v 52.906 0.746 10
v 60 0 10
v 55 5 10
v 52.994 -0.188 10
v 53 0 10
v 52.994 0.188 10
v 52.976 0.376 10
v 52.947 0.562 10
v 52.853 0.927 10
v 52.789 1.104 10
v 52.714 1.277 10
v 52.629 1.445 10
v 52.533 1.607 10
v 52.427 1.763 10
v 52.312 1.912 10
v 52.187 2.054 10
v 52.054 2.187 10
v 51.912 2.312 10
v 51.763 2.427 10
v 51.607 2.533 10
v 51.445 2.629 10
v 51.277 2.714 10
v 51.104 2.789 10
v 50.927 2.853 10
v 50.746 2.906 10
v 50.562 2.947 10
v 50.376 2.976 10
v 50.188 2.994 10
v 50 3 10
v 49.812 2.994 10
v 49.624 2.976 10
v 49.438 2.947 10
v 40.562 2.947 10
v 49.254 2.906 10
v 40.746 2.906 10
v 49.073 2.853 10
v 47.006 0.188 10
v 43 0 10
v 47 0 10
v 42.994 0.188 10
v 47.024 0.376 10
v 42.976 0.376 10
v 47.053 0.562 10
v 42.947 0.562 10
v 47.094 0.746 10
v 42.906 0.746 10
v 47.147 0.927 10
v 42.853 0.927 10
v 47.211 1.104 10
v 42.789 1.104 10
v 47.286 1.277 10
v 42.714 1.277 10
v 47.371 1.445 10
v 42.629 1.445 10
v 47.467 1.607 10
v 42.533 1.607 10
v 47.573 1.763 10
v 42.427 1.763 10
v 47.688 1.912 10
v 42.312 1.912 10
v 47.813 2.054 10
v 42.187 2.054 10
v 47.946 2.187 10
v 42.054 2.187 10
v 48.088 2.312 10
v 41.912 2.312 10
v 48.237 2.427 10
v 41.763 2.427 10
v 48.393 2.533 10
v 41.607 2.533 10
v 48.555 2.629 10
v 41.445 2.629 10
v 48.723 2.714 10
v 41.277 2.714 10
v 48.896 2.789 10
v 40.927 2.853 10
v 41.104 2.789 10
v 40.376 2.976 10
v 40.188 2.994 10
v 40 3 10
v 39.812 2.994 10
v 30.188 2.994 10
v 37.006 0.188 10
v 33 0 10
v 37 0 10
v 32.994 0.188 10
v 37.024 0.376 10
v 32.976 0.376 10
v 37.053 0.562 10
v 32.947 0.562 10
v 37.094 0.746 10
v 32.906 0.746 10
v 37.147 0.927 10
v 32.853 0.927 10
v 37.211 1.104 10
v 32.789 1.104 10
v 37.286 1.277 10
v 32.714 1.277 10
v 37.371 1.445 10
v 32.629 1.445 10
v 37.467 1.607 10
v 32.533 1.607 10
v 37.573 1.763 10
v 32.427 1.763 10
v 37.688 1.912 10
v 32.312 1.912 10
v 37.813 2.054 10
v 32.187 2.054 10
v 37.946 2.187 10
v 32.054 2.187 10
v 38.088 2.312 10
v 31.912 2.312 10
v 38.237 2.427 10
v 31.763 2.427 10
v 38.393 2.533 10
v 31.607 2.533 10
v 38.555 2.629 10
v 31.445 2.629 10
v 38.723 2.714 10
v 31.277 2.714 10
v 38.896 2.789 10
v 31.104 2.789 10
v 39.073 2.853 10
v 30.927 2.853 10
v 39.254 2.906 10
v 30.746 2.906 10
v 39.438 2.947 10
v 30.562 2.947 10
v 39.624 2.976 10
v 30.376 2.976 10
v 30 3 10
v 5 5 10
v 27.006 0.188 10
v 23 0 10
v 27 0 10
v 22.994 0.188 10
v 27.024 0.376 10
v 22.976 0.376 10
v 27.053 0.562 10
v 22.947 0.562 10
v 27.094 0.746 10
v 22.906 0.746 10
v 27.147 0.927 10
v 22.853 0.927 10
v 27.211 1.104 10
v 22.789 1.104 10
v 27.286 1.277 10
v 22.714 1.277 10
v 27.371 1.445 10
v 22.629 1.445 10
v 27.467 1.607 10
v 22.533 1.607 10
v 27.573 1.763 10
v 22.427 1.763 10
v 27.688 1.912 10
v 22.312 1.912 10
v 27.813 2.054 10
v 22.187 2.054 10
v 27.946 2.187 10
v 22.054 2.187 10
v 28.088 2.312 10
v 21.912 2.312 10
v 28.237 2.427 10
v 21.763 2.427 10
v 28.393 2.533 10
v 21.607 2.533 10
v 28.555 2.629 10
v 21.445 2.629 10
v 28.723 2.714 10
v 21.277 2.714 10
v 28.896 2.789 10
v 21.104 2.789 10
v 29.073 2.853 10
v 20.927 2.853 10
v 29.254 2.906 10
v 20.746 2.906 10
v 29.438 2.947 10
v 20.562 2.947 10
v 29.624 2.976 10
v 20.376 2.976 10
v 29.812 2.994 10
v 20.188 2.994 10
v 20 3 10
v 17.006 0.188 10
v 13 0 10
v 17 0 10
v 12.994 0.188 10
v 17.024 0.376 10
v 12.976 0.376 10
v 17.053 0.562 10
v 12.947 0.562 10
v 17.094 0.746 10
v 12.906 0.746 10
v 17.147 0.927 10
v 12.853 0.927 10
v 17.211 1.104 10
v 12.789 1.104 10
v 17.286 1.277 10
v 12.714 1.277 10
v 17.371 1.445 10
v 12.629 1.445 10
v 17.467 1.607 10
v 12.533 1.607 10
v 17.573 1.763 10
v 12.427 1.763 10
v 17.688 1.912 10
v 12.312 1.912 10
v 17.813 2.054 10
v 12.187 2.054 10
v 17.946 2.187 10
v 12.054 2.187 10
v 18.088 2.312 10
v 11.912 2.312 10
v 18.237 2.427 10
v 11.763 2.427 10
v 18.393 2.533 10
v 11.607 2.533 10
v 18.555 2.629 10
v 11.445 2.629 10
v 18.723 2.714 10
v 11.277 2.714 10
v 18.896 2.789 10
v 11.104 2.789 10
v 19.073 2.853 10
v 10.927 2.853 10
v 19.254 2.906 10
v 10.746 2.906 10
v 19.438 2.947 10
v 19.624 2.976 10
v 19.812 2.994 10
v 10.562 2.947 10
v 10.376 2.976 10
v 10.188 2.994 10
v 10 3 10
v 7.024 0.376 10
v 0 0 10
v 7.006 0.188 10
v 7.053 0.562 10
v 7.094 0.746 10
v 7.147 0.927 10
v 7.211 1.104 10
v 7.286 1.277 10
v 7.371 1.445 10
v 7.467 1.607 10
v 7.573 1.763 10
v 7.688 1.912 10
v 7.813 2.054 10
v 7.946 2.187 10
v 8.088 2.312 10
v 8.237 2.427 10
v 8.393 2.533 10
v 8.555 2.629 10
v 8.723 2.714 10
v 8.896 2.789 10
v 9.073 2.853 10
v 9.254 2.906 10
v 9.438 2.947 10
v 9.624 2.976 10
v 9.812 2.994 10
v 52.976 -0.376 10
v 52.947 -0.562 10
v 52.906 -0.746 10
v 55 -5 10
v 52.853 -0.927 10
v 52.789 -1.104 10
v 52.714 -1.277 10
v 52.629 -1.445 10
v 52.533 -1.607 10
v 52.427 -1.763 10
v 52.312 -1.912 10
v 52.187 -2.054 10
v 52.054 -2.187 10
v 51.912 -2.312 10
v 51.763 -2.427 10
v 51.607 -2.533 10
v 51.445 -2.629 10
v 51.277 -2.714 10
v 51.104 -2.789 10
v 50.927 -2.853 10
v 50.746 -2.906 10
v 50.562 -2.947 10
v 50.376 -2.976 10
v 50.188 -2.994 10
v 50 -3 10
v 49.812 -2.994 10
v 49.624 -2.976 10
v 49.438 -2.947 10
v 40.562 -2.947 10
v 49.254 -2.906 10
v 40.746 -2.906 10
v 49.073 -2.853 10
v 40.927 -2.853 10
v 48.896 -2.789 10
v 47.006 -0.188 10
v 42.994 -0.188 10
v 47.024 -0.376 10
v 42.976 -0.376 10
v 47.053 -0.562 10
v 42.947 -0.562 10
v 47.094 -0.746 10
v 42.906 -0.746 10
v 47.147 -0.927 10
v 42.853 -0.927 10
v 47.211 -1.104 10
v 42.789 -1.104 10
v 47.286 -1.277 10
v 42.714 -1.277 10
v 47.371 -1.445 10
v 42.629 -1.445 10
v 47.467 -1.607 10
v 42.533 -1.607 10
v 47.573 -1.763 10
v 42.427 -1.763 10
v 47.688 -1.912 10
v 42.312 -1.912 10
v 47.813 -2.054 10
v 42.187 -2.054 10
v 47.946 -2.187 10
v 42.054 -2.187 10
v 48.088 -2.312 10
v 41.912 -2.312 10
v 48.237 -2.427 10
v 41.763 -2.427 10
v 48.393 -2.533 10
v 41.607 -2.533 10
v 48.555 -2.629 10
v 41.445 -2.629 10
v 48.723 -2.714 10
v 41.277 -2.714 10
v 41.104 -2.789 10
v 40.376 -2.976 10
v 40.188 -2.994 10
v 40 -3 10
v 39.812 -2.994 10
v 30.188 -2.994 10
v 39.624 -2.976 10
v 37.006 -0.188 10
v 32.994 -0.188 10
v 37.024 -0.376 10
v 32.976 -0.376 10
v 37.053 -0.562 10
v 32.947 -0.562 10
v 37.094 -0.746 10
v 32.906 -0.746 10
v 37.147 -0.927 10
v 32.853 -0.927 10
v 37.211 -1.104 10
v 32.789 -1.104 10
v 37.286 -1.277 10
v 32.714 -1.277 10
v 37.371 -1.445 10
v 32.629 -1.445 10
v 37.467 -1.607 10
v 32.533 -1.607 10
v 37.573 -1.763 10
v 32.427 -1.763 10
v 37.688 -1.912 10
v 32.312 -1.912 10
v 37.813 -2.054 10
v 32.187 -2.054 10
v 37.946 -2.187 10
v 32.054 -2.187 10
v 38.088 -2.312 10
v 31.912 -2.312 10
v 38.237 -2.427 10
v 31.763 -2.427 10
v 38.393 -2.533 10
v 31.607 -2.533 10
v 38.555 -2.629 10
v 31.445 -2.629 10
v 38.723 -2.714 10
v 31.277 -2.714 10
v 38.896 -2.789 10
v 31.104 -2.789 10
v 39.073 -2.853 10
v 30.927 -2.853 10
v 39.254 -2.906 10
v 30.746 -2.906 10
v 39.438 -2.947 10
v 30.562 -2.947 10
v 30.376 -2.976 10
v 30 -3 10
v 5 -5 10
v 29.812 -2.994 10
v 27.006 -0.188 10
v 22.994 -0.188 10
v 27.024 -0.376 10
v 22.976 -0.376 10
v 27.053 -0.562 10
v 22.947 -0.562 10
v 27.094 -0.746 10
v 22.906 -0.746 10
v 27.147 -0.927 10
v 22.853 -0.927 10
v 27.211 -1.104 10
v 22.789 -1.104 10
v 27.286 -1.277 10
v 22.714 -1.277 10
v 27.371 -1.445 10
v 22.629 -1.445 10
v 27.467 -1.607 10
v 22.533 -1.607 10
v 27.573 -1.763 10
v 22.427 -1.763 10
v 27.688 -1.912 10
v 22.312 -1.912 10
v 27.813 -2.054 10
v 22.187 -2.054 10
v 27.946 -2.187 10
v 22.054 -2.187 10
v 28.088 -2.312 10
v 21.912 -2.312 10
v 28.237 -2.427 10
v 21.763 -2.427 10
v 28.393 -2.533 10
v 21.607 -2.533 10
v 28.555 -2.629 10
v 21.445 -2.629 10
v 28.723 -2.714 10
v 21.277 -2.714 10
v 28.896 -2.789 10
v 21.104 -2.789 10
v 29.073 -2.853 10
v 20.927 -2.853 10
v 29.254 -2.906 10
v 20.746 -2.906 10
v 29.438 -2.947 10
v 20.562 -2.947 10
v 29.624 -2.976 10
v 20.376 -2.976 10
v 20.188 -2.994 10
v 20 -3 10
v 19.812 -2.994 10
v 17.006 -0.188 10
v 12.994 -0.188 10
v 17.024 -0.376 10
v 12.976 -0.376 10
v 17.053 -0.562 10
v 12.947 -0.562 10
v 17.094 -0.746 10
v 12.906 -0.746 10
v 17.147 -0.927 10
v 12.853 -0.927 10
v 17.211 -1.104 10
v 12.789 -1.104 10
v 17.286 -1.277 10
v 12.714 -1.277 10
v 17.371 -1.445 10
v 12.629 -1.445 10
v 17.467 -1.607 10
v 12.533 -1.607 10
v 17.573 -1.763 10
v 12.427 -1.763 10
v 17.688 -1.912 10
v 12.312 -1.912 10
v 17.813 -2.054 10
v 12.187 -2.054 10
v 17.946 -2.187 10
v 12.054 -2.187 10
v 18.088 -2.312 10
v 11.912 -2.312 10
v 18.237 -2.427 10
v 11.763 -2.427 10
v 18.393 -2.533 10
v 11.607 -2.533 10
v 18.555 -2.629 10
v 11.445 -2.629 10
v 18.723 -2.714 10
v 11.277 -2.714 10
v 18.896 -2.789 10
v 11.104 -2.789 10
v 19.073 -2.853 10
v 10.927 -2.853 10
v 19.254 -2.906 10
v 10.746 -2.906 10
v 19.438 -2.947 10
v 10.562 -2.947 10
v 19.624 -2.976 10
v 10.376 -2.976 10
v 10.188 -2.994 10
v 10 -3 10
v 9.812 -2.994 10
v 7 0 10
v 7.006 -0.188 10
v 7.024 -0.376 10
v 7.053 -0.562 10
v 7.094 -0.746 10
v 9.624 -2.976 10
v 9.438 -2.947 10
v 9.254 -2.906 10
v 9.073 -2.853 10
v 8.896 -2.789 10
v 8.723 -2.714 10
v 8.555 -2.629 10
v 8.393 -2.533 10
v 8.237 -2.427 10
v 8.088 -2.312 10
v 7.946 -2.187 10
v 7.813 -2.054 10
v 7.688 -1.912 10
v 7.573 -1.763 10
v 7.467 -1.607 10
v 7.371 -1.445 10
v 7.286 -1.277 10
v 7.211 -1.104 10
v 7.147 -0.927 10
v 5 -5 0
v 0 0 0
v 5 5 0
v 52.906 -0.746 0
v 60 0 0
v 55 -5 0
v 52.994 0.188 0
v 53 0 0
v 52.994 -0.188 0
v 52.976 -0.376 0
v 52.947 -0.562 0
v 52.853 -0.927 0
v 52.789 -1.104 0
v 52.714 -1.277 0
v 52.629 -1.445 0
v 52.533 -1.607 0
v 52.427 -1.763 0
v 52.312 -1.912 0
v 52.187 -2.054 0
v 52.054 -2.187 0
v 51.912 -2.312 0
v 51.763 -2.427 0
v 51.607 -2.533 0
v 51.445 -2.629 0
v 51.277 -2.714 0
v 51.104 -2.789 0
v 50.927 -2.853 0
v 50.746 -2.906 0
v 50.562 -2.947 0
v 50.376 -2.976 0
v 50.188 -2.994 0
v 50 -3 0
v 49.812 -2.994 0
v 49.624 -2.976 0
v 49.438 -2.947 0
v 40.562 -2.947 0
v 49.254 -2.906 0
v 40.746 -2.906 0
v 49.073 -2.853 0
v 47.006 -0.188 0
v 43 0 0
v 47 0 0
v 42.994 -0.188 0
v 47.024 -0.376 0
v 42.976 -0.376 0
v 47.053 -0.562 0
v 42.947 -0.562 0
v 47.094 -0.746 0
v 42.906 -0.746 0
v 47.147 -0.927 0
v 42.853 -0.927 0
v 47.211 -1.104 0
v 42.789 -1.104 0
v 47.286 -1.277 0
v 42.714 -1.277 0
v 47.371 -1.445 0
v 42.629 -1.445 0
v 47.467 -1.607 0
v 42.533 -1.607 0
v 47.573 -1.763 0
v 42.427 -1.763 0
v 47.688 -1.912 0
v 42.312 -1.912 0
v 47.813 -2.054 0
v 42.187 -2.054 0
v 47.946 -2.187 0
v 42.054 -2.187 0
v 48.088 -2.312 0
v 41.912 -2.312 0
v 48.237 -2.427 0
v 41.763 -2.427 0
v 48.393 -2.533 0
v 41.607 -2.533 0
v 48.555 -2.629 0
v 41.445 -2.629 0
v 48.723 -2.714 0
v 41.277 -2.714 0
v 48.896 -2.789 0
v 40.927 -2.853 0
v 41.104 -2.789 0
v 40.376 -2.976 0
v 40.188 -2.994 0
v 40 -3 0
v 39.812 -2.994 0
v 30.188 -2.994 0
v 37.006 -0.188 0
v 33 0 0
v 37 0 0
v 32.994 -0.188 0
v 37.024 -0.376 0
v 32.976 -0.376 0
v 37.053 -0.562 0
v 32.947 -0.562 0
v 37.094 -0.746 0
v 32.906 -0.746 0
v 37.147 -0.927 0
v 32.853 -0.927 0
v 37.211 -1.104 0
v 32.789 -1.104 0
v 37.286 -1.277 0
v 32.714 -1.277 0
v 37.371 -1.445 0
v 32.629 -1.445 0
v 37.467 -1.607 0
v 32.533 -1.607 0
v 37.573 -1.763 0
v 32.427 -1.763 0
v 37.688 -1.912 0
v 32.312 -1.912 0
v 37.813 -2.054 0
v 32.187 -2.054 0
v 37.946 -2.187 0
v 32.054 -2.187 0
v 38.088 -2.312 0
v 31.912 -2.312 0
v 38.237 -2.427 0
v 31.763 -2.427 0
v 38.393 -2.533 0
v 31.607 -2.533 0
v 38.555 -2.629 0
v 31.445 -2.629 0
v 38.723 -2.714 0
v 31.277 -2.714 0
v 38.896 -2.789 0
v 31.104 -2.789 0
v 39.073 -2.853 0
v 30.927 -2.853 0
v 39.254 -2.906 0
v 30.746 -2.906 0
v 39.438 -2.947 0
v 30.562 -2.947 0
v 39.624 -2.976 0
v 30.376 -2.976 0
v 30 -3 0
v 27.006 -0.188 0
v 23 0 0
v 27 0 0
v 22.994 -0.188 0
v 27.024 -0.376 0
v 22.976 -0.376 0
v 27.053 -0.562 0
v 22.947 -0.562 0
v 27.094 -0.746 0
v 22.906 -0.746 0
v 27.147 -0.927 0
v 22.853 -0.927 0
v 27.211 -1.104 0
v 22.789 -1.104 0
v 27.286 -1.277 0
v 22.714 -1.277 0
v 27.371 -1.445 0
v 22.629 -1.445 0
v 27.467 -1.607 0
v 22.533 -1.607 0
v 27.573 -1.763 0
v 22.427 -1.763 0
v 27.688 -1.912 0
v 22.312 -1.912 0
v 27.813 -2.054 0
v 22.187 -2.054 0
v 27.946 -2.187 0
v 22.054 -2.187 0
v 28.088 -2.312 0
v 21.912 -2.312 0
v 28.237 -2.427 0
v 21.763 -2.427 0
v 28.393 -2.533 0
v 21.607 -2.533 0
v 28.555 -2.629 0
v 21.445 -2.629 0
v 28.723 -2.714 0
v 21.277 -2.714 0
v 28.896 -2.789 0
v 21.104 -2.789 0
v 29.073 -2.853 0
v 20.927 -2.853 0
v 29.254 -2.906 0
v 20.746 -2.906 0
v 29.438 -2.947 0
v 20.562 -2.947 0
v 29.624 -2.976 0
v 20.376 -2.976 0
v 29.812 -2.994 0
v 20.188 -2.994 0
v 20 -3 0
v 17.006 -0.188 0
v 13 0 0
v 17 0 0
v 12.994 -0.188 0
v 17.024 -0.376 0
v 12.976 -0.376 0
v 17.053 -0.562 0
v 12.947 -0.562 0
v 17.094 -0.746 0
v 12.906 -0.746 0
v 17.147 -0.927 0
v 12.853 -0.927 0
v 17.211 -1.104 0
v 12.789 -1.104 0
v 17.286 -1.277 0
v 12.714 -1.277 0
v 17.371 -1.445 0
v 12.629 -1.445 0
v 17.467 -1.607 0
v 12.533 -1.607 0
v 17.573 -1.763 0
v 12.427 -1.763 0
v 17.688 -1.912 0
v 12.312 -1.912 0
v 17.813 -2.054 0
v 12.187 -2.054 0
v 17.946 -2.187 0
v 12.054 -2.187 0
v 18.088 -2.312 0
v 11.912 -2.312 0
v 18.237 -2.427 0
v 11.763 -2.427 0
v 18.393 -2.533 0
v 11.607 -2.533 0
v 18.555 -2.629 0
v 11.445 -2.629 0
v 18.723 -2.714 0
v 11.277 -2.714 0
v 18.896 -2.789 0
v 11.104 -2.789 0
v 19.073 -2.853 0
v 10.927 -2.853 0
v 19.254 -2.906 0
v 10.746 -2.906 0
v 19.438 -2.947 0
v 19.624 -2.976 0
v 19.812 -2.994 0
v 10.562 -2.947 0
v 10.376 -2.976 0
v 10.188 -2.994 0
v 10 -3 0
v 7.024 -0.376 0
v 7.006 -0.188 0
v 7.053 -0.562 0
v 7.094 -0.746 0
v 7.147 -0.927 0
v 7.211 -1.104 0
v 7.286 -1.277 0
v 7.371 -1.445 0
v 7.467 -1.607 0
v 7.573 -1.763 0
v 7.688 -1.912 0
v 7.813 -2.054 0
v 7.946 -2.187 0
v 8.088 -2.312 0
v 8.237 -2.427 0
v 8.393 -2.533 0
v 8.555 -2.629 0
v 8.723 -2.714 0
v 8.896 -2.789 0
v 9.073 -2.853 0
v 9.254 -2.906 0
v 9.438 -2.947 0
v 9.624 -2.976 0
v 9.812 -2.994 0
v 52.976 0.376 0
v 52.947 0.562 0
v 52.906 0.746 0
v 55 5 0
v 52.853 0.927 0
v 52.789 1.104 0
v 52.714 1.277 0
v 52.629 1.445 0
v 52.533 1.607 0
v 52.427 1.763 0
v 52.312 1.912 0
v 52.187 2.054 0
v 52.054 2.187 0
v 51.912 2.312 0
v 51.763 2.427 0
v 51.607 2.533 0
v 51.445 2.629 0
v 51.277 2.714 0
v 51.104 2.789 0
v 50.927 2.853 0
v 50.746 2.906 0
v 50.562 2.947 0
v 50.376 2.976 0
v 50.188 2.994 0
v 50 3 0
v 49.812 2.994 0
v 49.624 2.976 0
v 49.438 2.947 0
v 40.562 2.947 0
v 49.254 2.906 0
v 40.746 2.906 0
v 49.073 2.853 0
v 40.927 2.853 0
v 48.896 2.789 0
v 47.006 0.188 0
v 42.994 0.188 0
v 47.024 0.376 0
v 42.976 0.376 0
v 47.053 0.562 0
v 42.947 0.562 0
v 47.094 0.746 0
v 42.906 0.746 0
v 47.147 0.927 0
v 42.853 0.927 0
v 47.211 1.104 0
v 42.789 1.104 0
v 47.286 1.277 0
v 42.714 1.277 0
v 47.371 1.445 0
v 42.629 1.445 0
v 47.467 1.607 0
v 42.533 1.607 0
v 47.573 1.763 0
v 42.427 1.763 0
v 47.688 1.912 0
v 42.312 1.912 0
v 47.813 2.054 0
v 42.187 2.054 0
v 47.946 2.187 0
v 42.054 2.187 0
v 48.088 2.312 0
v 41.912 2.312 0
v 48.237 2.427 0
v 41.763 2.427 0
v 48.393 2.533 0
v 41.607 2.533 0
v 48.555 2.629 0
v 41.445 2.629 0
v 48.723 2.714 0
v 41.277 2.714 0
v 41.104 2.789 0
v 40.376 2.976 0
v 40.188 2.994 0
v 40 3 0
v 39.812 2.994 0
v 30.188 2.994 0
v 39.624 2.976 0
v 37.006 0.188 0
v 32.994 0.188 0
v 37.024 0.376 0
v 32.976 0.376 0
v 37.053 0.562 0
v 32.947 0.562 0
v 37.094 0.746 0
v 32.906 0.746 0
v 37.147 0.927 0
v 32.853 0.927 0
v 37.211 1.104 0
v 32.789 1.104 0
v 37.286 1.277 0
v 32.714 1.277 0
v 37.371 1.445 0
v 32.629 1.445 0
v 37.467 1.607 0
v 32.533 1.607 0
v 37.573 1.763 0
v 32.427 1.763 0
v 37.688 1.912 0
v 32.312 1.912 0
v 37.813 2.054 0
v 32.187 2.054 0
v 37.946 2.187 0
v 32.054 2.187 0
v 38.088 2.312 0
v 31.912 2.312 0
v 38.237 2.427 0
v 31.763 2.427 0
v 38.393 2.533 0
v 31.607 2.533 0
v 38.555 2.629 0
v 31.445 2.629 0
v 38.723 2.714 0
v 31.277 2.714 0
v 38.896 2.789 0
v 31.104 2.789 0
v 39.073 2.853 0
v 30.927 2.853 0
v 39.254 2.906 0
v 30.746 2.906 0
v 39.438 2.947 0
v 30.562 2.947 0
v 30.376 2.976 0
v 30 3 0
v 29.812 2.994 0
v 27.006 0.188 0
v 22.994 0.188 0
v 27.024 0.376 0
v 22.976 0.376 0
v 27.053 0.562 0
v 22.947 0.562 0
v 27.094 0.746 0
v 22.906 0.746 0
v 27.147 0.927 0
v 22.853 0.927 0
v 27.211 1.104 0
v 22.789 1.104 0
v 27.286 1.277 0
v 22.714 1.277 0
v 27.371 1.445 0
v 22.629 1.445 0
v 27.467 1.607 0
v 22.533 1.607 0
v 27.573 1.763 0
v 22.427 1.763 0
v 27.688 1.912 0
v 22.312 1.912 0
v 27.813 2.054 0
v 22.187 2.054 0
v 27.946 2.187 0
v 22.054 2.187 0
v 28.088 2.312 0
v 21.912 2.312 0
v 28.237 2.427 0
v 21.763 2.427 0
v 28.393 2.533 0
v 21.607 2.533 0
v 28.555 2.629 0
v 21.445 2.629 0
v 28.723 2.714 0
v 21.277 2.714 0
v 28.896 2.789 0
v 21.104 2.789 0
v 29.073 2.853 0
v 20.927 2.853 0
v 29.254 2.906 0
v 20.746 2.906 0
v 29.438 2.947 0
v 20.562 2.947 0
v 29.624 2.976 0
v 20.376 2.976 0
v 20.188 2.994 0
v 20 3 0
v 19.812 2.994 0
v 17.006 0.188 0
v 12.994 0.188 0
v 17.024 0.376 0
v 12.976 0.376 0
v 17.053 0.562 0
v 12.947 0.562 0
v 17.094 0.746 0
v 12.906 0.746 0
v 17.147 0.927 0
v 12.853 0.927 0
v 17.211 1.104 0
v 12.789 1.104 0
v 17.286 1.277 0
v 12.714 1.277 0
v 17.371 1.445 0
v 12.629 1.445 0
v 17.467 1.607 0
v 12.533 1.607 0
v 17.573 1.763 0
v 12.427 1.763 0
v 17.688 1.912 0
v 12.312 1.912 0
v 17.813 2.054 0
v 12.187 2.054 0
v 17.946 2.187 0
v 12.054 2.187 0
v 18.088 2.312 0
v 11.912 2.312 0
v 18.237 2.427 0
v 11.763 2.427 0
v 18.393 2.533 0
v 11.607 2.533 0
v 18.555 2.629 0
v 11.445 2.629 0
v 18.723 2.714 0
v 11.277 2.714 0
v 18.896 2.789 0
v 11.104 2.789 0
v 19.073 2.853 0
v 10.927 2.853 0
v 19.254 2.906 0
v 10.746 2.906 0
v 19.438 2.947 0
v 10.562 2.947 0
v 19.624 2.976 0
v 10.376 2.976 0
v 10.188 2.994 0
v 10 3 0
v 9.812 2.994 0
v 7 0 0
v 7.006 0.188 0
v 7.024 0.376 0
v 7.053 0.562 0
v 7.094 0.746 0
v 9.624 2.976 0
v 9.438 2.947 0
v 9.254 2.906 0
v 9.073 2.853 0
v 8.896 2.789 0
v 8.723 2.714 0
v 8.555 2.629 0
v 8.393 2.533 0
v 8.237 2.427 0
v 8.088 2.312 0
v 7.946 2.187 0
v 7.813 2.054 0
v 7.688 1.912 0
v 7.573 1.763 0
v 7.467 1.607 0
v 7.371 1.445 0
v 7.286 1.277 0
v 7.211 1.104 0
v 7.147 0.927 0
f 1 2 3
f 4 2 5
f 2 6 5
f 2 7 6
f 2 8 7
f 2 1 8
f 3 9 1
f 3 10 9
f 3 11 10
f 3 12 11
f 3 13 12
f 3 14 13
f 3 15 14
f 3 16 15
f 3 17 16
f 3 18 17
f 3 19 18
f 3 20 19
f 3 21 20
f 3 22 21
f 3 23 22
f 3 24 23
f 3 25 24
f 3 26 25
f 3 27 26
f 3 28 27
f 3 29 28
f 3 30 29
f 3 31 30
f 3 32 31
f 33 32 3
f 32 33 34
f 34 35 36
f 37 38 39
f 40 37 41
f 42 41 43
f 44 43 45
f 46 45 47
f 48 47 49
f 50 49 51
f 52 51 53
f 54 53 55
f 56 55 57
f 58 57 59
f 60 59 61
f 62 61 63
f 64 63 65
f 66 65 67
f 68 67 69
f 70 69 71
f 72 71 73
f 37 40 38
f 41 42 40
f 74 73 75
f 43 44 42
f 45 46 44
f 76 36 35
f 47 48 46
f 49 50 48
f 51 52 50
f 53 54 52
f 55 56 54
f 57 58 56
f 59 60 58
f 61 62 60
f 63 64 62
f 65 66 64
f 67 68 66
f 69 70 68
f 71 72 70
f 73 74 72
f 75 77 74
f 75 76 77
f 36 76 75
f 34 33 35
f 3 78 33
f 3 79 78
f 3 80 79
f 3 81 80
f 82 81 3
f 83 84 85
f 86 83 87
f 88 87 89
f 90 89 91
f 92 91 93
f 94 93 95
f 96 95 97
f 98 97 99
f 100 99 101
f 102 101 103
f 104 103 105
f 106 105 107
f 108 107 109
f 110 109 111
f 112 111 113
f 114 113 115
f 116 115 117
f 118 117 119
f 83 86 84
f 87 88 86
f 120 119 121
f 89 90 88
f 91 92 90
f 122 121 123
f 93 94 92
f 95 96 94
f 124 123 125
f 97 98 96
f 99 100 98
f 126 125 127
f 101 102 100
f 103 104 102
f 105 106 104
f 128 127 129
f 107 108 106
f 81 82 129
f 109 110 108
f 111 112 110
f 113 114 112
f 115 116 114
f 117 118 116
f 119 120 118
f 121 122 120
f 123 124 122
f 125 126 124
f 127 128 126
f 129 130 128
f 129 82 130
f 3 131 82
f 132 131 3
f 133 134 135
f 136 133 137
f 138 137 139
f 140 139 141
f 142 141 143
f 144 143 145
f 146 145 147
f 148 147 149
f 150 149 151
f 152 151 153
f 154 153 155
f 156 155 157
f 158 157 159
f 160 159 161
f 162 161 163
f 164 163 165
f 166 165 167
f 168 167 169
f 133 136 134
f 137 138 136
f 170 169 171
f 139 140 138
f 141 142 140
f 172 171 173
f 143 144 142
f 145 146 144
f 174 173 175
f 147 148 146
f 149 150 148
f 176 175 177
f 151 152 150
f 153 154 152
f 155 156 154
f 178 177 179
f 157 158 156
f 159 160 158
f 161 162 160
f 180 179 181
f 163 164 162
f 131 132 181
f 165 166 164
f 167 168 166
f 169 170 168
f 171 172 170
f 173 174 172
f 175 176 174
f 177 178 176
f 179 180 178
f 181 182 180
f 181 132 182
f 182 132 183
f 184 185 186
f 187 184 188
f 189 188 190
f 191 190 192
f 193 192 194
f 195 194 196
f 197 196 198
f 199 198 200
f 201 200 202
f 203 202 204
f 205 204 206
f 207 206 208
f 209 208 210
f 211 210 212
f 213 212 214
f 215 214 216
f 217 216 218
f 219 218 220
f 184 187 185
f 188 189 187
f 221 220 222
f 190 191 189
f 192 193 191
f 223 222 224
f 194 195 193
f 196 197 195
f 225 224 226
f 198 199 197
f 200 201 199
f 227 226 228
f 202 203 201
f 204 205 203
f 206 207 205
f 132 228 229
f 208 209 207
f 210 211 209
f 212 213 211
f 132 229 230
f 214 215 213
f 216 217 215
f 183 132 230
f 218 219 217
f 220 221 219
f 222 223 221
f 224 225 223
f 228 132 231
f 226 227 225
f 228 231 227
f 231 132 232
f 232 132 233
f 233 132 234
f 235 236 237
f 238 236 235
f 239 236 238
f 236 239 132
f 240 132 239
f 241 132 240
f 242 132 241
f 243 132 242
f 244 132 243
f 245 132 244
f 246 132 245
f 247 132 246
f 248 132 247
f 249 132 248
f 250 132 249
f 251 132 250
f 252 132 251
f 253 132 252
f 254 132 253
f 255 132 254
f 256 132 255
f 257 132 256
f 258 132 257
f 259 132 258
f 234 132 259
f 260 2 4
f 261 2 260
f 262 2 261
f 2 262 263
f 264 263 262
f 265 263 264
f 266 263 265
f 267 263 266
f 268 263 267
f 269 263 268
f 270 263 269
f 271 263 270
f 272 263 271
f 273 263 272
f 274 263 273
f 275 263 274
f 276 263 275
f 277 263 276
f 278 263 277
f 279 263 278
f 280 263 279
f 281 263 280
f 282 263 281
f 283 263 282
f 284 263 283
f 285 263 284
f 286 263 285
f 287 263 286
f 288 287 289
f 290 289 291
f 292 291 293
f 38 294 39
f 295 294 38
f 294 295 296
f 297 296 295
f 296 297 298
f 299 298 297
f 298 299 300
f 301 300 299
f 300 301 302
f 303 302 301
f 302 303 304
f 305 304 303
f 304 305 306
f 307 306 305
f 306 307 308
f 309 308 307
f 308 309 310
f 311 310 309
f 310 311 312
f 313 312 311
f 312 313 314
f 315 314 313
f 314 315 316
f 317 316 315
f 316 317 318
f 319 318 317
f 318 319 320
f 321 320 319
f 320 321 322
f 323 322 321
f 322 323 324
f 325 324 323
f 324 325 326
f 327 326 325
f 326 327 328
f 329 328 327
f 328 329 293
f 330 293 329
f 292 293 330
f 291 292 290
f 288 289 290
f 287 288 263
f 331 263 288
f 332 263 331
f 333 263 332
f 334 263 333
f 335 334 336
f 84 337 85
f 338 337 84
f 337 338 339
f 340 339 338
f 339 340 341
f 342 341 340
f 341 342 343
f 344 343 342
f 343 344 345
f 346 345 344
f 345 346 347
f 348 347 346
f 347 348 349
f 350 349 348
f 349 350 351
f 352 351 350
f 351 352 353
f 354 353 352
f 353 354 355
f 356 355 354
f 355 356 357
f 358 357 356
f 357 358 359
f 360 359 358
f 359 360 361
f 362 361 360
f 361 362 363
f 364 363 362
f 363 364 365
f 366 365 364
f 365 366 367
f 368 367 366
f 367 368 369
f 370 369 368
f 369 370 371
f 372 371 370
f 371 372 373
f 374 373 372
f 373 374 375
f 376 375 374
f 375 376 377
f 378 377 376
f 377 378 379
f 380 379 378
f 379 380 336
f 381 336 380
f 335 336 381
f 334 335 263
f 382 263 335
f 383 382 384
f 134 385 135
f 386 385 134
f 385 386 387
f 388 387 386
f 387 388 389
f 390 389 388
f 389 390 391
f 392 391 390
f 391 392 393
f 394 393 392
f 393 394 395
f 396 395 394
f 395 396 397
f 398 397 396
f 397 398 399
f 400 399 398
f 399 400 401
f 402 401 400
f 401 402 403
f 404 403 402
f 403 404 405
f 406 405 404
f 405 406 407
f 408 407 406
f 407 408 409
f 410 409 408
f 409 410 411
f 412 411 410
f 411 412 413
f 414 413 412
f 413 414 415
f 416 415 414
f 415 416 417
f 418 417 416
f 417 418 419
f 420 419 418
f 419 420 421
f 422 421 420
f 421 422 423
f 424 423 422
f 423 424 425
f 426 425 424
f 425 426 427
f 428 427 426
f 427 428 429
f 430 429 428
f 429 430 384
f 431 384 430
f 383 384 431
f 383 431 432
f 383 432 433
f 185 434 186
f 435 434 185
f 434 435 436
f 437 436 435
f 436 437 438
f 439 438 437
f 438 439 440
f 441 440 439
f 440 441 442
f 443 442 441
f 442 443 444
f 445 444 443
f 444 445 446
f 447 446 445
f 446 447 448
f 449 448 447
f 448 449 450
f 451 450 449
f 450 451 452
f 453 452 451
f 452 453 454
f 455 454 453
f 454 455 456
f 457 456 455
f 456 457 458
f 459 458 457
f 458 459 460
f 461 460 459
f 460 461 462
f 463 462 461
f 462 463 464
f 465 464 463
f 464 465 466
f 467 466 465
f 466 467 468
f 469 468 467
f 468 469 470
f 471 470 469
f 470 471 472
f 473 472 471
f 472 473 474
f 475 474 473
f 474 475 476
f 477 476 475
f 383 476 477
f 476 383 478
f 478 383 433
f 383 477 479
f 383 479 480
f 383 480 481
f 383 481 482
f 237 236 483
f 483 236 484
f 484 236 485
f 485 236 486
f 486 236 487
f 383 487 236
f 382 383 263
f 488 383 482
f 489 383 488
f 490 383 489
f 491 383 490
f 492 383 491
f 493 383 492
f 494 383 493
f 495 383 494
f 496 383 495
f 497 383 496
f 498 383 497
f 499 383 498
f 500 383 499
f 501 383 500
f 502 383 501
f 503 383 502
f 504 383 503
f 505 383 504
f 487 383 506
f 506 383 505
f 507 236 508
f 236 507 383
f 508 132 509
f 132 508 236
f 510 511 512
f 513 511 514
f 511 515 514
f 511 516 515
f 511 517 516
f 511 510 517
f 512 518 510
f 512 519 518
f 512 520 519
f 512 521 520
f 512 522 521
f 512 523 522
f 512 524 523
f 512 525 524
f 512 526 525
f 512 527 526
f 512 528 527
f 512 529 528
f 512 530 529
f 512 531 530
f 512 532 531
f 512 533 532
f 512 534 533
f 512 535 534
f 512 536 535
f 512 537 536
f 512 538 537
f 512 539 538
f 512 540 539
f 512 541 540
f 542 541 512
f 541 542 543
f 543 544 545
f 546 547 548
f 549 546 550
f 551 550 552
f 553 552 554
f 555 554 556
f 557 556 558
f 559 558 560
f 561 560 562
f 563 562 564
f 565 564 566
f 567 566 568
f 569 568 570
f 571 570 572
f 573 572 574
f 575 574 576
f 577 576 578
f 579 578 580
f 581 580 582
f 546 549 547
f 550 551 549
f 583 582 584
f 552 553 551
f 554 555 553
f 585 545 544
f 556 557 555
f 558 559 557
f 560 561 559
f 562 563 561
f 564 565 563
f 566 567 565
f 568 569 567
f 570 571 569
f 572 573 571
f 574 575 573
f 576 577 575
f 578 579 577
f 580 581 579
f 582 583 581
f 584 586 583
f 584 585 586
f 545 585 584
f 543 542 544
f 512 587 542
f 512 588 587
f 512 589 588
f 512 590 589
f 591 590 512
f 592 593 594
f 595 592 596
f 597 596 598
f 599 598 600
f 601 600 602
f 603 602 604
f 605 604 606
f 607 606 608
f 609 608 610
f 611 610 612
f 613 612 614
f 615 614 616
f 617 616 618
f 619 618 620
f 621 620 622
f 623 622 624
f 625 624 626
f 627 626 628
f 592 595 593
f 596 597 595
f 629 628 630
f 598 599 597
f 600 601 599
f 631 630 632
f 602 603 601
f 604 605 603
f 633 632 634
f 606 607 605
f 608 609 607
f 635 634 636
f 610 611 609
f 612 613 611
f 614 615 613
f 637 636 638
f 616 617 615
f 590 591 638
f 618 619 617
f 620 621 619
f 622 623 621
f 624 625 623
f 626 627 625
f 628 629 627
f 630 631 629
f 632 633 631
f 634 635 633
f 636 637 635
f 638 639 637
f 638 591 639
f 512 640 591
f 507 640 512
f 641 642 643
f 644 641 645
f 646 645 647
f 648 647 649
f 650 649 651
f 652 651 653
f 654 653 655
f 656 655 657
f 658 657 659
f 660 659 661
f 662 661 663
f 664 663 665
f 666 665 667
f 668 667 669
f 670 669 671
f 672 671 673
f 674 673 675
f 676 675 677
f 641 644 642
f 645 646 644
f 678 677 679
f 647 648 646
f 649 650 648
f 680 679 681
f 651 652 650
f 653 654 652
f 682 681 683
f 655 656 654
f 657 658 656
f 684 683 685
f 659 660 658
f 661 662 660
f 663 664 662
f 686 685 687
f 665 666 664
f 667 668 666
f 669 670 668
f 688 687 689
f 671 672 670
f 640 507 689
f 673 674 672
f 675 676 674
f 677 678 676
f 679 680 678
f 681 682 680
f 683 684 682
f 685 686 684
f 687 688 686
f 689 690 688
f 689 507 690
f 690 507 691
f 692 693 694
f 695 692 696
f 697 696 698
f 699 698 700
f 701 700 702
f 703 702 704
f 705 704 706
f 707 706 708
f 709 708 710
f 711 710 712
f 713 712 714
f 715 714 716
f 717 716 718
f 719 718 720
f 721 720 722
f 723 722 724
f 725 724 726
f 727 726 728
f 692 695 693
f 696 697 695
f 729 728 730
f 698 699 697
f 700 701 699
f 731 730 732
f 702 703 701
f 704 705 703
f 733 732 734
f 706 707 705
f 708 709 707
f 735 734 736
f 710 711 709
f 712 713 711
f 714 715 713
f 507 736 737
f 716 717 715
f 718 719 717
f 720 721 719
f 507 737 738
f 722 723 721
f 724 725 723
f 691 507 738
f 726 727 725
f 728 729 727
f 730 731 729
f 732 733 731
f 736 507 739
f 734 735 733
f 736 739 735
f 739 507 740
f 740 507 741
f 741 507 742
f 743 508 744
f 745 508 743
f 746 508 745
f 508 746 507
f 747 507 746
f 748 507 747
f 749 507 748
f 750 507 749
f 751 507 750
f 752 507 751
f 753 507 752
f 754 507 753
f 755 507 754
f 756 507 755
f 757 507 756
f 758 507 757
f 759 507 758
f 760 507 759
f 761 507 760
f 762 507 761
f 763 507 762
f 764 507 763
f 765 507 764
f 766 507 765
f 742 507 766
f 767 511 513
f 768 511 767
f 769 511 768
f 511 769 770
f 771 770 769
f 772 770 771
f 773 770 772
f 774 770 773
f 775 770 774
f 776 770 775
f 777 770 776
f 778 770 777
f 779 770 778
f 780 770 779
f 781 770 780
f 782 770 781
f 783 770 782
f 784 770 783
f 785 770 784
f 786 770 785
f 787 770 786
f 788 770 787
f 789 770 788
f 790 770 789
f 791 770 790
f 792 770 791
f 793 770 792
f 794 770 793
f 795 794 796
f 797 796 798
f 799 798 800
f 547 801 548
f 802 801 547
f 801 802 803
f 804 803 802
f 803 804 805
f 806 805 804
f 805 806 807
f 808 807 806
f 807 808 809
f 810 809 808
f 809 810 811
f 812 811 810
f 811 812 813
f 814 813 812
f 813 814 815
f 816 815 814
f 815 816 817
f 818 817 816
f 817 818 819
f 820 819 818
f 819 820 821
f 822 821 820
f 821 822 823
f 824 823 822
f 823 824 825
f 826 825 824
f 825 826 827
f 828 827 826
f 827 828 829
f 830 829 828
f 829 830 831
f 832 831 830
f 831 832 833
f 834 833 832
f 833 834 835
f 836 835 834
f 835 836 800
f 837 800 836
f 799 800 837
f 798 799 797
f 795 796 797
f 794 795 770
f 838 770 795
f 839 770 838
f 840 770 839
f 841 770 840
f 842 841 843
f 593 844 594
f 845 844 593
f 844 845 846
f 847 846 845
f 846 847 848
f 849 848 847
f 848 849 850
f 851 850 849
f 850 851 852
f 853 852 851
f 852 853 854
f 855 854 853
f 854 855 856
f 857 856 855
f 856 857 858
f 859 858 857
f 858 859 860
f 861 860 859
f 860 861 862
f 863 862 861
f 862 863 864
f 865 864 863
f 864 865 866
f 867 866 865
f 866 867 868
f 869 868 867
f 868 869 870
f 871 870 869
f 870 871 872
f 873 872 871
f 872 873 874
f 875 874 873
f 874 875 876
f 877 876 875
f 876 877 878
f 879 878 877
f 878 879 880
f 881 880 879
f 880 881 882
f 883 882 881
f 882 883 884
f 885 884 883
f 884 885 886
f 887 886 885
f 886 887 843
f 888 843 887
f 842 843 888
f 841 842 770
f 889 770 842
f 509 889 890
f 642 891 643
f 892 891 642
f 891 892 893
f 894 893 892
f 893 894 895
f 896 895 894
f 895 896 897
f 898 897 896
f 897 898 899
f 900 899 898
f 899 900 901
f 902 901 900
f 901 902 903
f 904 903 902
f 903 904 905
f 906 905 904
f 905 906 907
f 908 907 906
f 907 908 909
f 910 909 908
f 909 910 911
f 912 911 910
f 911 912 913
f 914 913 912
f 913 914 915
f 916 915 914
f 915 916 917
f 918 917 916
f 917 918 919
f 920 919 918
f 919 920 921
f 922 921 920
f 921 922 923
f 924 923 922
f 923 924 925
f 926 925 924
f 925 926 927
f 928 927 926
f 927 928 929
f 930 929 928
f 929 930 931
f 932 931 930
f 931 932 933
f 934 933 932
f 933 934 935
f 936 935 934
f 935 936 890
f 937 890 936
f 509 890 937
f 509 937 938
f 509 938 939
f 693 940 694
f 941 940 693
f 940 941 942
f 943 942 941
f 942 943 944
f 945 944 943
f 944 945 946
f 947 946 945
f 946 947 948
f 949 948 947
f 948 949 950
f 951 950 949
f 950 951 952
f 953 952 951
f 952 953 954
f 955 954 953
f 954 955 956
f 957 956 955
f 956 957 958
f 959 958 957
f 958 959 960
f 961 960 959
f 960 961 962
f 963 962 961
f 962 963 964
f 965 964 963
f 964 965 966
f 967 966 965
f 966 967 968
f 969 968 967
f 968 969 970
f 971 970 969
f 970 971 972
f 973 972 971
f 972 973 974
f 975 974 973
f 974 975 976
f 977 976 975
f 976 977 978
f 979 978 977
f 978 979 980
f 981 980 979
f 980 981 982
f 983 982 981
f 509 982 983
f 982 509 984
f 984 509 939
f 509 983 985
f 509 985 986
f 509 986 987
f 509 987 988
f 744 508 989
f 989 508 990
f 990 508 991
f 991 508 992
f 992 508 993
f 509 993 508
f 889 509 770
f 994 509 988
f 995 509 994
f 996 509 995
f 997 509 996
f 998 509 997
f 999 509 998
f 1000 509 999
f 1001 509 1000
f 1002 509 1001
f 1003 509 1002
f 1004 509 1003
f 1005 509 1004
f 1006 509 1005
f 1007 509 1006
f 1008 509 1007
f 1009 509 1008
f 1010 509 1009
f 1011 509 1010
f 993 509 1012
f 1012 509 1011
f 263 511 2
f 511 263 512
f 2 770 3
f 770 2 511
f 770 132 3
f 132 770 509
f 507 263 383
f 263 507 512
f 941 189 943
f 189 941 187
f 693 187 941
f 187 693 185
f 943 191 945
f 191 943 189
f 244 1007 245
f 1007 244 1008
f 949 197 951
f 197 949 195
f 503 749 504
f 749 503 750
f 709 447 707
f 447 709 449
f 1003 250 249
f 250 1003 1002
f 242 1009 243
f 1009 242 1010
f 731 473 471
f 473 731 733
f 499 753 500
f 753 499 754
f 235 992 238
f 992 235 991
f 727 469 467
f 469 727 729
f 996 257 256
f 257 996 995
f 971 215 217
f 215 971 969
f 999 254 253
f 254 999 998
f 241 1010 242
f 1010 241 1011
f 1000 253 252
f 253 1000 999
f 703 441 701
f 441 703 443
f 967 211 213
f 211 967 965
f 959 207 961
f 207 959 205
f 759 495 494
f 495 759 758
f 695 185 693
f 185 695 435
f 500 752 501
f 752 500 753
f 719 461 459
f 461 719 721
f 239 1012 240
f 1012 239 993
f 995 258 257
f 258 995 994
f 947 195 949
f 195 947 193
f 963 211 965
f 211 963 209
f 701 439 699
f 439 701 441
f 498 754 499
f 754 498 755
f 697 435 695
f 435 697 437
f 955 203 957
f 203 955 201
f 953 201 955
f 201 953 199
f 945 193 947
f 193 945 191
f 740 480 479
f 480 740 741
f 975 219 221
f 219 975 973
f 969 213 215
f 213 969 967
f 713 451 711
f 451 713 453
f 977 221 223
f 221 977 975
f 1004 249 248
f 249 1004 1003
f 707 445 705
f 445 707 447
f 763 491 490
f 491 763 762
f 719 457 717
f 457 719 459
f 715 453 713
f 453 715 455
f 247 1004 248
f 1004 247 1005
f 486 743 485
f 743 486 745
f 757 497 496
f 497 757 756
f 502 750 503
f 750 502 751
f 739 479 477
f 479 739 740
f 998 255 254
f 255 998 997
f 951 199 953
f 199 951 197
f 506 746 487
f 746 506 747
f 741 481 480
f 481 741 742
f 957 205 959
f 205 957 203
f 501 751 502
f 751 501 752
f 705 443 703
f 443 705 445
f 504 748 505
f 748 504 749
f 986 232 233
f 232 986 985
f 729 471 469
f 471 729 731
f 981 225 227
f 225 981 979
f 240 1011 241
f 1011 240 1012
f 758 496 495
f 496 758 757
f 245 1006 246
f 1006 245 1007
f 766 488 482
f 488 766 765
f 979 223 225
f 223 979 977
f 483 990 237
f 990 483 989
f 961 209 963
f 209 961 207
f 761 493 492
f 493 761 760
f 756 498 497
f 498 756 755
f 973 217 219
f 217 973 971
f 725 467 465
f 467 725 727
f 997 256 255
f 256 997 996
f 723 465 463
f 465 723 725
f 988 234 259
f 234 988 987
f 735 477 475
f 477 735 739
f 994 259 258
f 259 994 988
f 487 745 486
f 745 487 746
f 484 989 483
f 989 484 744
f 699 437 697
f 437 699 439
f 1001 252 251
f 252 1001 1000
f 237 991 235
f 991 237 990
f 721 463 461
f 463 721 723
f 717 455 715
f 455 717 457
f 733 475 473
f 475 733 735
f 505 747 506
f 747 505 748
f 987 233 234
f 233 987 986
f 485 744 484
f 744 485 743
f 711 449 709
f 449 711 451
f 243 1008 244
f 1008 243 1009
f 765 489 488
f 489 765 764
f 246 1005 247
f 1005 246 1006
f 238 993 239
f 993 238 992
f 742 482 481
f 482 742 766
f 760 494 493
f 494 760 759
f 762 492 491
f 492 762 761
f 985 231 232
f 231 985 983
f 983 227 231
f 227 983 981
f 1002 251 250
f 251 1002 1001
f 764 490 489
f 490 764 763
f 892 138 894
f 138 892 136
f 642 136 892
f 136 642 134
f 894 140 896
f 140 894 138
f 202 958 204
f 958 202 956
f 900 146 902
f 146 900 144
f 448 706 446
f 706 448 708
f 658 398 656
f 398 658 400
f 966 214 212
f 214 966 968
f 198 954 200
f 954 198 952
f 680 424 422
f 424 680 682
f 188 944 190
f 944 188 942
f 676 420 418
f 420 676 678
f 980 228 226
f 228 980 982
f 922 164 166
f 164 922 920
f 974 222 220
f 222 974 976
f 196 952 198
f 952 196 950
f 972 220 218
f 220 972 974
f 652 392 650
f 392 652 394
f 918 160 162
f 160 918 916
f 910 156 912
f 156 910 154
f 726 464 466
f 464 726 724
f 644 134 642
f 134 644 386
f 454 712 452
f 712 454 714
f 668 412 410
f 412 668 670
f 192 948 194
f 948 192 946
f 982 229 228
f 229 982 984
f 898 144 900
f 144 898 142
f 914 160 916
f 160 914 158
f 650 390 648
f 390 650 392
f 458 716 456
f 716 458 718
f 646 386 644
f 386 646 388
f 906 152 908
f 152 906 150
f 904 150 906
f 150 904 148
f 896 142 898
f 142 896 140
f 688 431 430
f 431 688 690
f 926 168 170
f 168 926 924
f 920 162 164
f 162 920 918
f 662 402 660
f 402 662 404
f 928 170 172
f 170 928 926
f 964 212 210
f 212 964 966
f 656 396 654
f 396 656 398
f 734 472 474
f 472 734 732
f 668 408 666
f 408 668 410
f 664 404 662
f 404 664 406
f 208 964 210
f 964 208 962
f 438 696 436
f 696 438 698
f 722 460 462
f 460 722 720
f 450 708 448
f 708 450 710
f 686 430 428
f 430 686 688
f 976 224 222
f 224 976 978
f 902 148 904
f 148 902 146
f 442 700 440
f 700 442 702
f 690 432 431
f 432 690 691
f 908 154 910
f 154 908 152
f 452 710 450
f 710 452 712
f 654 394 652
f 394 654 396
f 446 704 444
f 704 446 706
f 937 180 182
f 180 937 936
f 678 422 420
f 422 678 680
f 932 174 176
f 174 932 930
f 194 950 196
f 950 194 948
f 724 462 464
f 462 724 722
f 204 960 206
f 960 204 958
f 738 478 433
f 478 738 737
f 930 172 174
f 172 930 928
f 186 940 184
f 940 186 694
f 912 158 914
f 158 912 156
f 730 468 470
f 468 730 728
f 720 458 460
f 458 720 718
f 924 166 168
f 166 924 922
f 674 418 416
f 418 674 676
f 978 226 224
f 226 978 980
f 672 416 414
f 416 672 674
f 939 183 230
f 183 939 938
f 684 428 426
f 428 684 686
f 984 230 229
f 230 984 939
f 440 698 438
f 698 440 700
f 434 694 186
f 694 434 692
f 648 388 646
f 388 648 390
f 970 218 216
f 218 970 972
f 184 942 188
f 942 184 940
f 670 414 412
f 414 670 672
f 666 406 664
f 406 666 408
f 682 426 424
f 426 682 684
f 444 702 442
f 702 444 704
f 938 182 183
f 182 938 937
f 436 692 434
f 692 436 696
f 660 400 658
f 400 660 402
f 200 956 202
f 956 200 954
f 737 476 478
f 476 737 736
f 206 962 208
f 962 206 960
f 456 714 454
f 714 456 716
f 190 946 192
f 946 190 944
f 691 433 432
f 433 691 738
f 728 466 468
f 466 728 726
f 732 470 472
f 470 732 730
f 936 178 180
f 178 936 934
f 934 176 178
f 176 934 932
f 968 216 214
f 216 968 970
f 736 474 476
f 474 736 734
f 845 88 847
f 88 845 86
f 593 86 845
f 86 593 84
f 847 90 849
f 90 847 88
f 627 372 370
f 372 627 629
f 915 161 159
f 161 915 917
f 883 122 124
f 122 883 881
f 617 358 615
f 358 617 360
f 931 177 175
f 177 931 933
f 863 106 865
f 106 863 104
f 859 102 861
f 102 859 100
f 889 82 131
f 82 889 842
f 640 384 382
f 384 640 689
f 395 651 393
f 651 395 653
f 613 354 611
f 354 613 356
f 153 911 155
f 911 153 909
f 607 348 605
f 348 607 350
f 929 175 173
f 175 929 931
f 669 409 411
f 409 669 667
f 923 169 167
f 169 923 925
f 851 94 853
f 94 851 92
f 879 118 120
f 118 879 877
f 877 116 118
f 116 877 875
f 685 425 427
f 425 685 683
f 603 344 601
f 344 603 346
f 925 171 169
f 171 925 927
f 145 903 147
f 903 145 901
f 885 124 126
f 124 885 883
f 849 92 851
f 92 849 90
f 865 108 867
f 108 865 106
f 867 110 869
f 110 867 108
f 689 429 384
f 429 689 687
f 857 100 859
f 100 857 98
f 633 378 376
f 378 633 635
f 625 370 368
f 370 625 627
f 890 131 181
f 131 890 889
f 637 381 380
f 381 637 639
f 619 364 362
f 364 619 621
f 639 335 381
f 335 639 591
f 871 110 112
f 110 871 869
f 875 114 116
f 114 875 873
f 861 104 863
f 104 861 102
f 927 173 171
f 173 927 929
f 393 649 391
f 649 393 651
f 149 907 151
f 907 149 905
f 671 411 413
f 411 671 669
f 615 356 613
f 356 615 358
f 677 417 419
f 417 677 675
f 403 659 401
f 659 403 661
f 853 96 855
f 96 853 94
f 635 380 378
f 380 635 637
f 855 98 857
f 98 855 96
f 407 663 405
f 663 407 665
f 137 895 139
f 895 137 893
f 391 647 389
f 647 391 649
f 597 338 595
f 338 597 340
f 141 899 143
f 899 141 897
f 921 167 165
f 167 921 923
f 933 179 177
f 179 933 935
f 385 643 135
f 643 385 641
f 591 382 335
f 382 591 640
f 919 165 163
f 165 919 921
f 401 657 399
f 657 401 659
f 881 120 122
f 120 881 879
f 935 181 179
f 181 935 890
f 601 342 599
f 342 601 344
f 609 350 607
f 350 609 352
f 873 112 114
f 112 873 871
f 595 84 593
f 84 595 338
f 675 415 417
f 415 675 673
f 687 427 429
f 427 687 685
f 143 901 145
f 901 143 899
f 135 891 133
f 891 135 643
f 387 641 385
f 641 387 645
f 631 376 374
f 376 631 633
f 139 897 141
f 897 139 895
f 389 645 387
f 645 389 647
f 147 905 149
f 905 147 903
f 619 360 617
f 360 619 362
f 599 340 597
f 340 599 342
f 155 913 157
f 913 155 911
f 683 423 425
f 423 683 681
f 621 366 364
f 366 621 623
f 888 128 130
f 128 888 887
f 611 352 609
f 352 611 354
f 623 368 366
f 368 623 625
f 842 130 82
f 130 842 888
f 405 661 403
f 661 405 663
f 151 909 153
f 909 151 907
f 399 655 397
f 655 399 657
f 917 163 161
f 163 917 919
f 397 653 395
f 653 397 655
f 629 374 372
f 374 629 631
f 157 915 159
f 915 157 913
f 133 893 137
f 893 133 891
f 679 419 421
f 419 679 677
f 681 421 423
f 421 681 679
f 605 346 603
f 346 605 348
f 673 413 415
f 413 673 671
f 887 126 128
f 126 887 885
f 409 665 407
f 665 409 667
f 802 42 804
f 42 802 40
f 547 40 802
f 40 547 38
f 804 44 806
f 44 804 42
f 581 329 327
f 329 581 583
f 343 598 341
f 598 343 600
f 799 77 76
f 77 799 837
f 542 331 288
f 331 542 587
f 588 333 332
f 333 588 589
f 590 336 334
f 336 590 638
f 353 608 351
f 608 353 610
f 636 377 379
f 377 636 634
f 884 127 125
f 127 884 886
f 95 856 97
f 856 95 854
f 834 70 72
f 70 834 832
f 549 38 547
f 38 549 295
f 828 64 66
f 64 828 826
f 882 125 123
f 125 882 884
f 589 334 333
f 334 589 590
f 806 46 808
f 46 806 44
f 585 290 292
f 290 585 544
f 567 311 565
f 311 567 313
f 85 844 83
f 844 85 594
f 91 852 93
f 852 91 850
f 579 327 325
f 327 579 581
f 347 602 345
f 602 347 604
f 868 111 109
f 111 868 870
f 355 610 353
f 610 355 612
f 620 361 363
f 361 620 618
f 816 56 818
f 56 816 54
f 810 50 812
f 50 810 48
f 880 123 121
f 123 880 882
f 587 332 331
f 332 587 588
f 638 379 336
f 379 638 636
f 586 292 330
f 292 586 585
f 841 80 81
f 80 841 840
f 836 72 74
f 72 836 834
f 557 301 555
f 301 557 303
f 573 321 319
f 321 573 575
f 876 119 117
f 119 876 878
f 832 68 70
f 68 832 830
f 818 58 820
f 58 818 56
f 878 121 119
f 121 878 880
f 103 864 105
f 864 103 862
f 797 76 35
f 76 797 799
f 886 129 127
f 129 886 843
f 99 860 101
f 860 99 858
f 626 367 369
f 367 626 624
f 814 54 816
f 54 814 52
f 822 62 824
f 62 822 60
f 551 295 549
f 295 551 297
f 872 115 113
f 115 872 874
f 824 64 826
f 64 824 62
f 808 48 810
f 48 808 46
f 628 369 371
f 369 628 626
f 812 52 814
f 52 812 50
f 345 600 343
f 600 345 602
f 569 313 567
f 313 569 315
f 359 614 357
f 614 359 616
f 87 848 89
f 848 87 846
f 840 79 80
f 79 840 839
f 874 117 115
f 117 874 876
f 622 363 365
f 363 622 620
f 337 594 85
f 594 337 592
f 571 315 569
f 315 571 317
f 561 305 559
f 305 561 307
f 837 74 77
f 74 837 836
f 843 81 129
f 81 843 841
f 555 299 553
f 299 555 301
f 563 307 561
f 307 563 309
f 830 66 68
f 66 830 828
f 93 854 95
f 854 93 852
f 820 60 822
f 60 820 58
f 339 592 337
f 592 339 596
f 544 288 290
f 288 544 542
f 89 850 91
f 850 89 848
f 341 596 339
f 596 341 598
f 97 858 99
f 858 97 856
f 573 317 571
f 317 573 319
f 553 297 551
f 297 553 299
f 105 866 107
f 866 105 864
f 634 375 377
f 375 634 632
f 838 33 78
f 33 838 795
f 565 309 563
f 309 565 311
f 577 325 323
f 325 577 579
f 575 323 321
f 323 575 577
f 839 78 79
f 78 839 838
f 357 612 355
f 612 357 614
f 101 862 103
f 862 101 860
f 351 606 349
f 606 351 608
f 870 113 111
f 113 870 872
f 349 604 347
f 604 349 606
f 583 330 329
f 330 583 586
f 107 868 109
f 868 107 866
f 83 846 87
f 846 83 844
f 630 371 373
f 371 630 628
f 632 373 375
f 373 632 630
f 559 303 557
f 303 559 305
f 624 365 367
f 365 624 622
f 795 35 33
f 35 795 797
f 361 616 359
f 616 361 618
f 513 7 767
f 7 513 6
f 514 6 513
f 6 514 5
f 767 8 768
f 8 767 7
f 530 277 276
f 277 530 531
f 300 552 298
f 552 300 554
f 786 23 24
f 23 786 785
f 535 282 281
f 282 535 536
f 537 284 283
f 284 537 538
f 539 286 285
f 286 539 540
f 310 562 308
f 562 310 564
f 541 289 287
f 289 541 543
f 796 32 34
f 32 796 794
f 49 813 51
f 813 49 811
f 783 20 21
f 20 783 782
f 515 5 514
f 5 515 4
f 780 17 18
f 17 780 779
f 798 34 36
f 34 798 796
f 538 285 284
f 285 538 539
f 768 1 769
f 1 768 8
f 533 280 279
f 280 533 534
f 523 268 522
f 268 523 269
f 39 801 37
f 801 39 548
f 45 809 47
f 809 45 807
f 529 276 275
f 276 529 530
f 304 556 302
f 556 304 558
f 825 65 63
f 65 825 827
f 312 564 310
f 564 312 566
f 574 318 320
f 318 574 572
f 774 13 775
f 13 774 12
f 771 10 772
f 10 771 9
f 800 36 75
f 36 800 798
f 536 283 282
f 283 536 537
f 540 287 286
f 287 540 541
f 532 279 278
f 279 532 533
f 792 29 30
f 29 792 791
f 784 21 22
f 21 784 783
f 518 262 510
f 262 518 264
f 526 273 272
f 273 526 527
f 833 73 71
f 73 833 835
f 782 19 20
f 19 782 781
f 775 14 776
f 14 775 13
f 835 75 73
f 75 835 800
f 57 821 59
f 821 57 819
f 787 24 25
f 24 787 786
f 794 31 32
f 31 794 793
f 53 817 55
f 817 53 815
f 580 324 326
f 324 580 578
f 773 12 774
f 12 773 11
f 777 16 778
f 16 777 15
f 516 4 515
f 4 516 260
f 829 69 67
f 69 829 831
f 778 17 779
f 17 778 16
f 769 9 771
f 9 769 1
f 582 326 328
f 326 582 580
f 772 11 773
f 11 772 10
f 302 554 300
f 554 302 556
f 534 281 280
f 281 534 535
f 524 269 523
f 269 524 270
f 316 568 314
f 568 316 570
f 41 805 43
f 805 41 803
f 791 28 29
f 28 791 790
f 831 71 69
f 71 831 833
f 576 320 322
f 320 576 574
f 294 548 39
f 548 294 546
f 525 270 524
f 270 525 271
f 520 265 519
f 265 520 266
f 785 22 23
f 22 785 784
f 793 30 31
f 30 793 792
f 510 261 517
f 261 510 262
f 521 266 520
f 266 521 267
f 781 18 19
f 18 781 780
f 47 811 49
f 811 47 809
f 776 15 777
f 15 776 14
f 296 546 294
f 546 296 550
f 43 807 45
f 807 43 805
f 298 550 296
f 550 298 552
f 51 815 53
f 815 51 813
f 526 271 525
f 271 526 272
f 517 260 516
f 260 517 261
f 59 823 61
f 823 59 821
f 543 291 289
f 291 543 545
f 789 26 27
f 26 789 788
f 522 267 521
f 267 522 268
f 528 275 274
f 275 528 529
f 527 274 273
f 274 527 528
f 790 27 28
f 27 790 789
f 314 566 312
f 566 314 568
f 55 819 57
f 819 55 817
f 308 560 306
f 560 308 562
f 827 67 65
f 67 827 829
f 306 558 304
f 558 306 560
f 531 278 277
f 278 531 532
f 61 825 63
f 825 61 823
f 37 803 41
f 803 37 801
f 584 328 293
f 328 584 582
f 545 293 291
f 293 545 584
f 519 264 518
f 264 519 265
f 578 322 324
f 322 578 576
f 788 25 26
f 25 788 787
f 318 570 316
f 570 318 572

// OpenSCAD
$fn=100;
num_holes = 5;
hole_radius = 3;
width = 10;
height = 10;
length = 60;

side_length = length / sqrt(2);
module holesStick() {
	difference() {
		intersection() {
			translate([1 / sqrt(2) * side_length, 1 / sqrt(2) * -side_length, 0]) {
				rotate([0, 0, 45]) { //Create the pointy edges.
					cube([side_length, side_length, height]);
				}
			}
			translate([0, -width / 2, 0]) { //Create the long shape.
				cube([sqrt(2) * side_length, width, height]);
			}
		}
		for(x = [width:(sqrt(2) * side_length - 20) / (num_holes - 1):length - width]) {
			translate([x, 0, -1]) {
				cylinder(r = hole_radius, h = height+2); //The holes.
			}
		}
	}
}

holesStick();
